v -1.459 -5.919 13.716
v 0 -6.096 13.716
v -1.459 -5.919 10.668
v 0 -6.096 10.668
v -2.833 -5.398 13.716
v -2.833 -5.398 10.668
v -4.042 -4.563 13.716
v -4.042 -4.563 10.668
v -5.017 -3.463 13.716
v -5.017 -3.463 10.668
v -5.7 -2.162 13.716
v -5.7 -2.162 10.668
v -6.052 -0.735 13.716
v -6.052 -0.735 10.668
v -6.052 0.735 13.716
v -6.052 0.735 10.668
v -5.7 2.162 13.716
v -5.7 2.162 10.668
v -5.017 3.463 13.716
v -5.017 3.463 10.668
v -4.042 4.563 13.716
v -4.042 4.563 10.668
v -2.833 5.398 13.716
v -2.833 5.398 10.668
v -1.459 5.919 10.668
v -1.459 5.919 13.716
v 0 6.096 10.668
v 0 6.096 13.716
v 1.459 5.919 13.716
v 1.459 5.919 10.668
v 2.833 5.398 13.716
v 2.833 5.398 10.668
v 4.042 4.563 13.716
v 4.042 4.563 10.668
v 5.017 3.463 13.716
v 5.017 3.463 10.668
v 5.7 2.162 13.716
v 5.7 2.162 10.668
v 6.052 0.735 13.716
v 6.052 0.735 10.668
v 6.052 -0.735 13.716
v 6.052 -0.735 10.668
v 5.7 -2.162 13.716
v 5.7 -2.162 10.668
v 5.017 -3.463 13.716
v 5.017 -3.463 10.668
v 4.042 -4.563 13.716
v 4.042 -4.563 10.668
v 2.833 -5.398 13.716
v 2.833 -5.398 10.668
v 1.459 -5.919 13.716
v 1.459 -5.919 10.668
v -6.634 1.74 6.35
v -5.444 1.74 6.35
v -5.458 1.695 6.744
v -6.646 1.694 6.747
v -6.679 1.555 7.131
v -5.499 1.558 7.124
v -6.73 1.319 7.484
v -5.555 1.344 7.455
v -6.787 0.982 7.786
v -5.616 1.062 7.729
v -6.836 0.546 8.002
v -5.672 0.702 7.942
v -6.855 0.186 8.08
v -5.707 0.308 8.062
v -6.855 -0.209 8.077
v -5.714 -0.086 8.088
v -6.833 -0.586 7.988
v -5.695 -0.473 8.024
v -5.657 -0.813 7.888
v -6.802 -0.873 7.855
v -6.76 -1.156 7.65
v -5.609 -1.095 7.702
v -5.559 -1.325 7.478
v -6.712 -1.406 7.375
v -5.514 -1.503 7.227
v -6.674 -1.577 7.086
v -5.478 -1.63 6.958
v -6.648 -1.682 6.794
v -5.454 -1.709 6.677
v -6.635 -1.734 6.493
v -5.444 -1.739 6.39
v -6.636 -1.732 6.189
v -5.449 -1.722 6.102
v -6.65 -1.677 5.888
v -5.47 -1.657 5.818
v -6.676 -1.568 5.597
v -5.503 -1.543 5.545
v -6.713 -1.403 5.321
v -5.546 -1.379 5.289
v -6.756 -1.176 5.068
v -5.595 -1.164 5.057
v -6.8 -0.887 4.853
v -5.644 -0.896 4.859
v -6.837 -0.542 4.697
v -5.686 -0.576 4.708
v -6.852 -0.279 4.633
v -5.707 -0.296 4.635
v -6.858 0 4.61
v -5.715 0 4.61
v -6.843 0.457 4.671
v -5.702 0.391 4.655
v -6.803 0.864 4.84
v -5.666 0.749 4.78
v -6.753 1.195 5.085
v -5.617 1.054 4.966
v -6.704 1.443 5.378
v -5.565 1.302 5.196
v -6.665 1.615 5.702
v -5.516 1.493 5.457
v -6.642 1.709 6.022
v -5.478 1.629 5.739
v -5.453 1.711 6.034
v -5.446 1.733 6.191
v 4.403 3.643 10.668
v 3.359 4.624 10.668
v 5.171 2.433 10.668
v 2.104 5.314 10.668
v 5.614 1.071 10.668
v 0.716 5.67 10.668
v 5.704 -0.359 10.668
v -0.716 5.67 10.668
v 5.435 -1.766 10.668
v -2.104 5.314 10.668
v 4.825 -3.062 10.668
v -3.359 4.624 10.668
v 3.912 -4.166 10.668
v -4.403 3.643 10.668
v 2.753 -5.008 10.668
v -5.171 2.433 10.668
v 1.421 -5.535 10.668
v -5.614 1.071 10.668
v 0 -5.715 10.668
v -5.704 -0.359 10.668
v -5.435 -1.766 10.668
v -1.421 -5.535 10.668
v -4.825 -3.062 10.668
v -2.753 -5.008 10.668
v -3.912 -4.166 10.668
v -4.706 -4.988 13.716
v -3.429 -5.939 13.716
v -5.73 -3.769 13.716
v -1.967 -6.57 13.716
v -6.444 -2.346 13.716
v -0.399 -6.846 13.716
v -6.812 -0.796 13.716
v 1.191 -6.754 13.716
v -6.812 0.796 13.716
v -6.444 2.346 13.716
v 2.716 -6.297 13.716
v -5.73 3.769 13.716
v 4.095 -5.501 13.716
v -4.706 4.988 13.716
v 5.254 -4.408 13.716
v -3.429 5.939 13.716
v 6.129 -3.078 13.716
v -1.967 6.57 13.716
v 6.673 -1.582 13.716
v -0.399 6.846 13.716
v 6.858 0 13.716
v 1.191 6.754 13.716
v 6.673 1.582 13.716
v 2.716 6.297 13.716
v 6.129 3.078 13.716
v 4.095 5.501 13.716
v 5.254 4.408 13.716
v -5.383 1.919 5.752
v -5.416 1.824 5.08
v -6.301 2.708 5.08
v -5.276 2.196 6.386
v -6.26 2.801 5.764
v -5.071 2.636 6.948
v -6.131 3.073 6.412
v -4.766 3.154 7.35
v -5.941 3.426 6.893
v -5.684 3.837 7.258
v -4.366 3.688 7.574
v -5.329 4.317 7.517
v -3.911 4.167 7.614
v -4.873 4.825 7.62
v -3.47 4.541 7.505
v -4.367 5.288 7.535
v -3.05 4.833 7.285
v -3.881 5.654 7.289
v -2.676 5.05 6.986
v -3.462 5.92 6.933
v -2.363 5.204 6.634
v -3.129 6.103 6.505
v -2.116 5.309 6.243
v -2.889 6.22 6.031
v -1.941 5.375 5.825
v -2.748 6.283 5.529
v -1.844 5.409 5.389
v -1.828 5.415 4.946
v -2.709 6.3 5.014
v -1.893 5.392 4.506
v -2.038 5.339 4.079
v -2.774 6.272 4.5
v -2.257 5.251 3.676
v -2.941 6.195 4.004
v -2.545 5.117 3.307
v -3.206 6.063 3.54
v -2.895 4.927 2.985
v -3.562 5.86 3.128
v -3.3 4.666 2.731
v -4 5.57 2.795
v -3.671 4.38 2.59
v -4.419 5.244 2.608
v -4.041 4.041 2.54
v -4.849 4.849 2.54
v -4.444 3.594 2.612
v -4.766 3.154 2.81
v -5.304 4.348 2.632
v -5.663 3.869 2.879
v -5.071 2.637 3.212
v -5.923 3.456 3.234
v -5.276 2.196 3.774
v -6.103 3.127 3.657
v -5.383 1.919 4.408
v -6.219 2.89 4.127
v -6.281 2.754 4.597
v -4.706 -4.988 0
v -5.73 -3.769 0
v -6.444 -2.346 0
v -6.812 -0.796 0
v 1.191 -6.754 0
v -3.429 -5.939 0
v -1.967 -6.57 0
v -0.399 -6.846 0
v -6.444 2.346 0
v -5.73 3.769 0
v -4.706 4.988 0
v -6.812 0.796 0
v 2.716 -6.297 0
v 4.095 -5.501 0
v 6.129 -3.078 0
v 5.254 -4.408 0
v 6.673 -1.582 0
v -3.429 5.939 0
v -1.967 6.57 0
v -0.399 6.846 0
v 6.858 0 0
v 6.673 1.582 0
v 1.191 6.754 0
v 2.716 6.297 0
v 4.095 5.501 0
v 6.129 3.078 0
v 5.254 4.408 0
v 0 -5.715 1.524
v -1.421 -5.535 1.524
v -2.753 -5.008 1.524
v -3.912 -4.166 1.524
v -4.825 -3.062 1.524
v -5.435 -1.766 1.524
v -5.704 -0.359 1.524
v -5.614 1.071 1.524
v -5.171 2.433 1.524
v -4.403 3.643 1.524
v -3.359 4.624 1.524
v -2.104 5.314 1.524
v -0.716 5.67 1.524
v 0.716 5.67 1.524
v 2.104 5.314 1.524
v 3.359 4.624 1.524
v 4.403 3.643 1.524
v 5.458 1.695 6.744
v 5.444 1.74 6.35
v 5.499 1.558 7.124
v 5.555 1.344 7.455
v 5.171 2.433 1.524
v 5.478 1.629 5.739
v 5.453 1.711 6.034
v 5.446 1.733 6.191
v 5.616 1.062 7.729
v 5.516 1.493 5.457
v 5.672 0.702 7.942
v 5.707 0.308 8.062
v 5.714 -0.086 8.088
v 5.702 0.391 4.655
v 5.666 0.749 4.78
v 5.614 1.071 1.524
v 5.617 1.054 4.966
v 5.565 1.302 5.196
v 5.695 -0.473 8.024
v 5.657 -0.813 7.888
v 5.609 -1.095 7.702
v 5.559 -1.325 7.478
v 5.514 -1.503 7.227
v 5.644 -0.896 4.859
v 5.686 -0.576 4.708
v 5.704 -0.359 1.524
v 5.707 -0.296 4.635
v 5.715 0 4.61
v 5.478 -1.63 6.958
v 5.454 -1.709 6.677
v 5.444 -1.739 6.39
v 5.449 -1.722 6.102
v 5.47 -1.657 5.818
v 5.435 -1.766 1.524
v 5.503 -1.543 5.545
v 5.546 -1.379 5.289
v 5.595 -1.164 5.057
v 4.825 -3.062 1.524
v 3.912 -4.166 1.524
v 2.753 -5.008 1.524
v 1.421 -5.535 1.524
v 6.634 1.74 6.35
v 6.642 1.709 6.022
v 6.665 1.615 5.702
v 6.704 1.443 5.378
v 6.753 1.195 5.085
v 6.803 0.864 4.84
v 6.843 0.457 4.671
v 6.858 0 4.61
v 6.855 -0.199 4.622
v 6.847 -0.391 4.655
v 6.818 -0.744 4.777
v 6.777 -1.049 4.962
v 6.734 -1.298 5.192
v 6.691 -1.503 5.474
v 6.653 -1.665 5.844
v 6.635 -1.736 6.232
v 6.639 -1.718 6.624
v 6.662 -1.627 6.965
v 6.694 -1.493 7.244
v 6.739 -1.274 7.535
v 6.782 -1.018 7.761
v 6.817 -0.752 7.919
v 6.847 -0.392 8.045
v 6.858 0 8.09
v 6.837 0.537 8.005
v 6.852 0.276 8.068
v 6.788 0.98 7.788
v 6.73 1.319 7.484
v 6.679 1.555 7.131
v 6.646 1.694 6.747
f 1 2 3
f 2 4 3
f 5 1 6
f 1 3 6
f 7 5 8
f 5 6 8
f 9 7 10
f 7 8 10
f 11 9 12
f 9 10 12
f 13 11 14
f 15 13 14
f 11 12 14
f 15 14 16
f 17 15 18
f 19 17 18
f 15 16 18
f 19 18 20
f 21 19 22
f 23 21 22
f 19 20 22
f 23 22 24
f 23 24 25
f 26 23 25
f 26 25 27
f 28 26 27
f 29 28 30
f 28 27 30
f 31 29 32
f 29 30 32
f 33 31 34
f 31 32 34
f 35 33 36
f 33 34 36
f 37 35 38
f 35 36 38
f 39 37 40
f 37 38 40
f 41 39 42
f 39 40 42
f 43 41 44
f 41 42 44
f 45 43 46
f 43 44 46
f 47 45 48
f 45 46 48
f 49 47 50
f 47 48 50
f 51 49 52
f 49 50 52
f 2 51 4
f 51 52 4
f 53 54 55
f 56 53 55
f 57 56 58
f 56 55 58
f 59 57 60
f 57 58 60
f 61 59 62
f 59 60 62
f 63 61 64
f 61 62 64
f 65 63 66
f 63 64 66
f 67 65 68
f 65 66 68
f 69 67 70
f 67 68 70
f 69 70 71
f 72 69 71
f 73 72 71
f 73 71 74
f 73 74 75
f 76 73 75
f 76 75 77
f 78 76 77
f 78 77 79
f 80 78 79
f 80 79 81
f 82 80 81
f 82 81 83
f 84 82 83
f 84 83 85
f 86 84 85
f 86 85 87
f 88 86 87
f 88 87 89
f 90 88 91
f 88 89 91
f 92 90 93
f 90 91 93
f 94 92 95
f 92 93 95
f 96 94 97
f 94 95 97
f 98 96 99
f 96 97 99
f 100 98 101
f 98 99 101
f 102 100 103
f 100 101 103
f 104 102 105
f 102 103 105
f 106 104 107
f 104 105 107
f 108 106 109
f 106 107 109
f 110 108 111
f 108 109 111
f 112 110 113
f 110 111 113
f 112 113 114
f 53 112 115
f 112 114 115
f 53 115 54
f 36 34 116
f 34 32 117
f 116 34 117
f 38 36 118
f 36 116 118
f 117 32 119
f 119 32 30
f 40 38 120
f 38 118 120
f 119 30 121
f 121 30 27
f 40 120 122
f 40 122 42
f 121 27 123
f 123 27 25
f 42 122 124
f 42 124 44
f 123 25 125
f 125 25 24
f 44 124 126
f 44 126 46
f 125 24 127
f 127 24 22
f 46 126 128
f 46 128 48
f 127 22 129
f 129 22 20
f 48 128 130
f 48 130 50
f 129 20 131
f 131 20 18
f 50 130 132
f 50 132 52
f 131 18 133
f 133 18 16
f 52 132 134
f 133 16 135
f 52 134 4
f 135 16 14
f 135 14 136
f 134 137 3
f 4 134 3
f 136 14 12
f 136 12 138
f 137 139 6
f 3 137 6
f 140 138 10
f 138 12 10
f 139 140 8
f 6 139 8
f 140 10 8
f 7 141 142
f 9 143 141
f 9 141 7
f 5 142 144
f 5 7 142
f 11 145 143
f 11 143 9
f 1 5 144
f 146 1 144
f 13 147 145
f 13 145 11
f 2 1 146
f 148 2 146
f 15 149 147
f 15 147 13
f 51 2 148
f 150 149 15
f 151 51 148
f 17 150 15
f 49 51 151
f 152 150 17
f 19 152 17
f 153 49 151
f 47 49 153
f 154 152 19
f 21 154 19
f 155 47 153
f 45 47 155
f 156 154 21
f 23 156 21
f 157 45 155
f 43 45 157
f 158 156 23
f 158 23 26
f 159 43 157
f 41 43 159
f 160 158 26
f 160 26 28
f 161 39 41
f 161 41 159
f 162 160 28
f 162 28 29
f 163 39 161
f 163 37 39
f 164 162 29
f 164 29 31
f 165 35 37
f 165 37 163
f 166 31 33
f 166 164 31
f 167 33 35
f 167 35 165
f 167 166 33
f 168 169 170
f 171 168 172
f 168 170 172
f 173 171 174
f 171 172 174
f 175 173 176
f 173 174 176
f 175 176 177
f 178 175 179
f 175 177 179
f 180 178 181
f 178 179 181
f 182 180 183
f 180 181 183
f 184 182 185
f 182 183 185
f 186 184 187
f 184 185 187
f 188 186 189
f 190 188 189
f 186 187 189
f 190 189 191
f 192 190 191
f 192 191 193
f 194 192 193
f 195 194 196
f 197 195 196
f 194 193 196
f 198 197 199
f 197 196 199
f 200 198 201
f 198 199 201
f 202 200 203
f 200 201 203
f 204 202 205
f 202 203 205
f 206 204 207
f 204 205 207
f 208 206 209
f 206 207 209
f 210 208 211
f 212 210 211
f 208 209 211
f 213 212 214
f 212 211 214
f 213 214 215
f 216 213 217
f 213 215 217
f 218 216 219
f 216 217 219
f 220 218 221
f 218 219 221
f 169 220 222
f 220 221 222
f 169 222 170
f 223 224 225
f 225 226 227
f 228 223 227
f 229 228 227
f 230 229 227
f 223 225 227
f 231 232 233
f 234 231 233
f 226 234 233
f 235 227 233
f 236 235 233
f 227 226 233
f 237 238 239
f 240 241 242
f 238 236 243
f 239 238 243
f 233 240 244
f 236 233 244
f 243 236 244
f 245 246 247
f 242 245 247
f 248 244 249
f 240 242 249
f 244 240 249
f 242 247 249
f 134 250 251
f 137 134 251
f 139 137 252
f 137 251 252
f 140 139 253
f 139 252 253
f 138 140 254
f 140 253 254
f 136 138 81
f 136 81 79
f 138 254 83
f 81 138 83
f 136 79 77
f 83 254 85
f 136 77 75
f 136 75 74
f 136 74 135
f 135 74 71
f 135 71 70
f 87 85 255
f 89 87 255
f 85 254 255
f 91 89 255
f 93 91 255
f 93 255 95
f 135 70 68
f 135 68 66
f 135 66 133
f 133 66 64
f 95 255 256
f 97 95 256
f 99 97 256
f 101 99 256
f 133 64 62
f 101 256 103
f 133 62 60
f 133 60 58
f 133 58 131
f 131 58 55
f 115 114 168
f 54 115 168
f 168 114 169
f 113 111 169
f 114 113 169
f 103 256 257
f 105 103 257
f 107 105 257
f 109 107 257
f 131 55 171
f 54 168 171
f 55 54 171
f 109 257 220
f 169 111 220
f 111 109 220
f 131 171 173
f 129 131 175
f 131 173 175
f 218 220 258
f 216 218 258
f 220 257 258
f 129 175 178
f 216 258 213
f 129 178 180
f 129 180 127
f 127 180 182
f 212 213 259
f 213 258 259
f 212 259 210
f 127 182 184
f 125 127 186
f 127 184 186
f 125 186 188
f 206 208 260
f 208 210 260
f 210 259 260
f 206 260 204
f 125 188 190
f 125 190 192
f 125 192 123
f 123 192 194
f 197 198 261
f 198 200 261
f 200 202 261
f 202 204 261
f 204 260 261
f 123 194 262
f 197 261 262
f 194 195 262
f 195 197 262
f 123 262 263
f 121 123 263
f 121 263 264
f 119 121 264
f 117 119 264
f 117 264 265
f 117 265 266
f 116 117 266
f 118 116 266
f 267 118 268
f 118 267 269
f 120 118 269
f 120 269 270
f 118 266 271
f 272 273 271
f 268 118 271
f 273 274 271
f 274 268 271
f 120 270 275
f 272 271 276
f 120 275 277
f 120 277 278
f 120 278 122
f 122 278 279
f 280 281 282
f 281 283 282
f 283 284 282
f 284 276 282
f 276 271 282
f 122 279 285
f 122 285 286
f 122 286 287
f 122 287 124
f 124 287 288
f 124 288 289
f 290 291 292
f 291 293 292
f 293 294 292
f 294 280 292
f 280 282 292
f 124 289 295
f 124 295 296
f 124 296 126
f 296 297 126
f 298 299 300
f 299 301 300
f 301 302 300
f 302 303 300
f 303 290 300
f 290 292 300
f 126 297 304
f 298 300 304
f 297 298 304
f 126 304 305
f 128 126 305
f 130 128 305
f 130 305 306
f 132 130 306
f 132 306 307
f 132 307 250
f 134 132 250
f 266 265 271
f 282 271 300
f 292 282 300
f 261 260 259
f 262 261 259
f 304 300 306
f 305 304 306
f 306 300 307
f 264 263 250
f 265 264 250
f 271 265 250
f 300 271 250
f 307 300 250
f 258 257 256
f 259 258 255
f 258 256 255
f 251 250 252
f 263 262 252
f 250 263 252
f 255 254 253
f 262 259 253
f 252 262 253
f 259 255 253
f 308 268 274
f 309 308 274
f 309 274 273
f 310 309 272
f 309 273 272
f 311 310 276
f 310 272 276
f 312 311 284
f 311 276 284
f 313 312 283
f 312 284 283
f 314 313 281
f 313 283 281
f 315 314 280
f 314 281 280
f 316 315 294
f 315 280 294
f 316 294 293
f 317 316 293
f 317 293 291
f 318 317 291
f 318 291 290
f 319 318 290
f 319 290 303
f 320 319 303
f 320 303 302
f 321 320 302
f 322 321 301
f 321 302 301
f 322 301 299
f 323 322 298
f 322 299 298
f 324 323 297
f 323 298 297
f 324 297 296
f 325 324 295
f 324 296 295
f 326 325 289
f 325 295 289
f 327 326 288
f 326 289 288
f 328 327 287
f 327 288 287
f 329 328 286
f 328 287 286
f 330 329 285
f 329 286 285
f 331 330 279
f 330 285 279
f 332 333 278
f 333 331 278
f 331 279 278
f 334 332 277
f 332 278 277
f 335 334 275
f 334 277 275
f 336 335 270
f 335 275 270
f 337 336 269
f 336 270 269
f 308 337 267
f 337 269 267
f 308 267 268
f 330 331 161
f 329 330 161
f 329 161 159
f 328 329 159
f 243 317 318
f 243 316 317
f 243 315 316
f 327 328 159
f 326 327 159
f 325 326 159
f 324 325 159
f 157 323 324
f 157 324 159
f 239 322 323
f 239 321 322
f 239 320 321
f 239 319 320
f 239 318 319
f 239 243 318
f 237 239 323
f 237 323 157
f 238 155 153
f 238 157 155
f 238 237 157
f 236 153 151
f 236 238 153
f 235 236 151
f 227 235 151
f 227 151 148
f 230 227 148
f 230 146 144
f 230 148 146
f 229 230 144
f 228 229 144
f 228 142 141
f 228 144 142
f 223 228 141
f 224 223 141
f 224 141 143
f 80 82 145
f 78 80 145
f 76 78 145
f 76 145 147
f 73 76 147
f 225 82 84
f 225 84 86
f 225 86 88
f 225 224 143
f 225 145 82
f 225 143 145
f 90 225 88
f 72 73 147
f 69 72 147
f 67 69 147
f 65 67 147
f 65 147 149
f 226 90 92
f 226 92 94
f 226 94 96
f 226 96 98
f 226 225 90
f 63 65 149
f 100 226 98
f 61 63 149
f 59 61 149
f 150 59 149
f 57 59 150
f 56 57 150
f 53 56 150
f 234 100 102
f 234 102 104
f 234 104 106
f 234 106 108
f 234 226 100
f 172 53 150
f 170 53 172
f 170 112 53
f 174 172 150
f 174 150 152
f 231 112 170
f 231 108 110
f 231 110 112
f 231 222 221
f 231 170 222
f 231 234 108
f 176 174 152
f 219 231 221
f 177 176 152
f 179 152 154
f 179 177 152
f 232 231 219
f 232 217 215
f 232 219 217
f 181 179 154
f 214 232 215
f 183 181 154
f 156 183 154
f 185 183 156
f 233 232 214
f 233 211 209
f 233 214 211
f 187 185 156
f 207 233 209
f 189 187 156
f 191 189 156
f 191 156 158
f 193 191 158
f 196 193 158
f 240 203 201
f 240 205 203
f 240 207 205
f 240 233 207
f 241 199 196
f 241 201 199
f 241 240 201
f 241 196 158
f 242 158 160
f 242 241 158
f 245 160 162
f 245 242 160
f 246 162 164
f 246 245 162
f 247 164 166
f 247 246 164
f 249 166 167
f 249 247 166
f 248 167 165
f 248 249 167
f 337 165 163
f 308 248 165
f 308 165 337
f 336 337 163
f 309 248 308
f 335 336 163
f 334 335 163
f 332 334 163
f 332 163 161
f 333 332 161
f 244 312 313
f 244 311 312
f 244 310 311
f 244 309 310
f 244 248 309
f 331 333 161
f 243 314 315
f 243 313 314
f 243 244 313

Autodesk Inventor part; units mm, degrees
ref_plane "YZ Plane" through (0, 0, 0) normal (1, 0, 0) x (0, 1, 0)
ref_plane "XZ Plane" through (0, 0, 0) normal (0, 1, 0) x (-1, 0, 0)
ref_plane "XY Plane" through (0, 0, 0) normal (0, 0, 1) x (1, 0, 0)
sketch "Sketch1" plane through (0, 0, 0) normal (0, 0, 1) x (1, 0, 0)
  circle A0 centre (0, 0) radius 6.858
  dimension "d0" = 13.716
extrude "Extrusion1" add sketch "Sketch1" along normal blind 13.716
hole "Hole1" at (0, 0, 13.716) direction (0, 0, -1) diameter 12.192 depth 3.048
hole "Hole2" at (0, 0, 10.668) direction (0, 0, -1) diameter 11.43 depth 9.144
sketch "Sketch2" plane through (0, 0, 0) normal (1, 0, 0) x (0, 1, 0)
  line L0 (0, 0) -> (0, 6.35)
  circle A0 centre (0, 6.35) radius 1.7399
  dimension "d21" = 6.35
  dimension "d22" = 3.4798
extrude "Extrusion2" cut sketch "Sketch2" along normal through all both and the other way through all
sketch "Sketch3" plane through (0, 0, 0) normal (0, 0, -1) x (-1, 0, 0)
  line L0 (0, 0) -> (4.8942, 4.8942)
  line L1 (0, 0) -> (0, 6.9215) construction
sketch "Sketch4" plane through (0, 0, 0) normal (0, 1, 0) x (-1, 0, 0)
  point P0 (0, 0)
ref_plane "Work Plane1" through (-4.8942, 4.8942, 0) normal (-0.7071, 0.7071, 0) x (-0.7071, -0.7071, 0)
sketch "Sketch5" plane through (-4.8942, 4.8942, 0) normal (-0.7071, 0.7071, 0) x (-0.7071, -0.7071, 0)
  line L0 (0, 0) -> (0, 5.08)
  circle A0 centre (0, 5.08) radius 2.54
  dimension "d25" = 5.08
  dimension "d26" = 5.08
extrude "Extrusion3" cut sketch "Sketch5" against normal up to next
properties part number "Piston"
